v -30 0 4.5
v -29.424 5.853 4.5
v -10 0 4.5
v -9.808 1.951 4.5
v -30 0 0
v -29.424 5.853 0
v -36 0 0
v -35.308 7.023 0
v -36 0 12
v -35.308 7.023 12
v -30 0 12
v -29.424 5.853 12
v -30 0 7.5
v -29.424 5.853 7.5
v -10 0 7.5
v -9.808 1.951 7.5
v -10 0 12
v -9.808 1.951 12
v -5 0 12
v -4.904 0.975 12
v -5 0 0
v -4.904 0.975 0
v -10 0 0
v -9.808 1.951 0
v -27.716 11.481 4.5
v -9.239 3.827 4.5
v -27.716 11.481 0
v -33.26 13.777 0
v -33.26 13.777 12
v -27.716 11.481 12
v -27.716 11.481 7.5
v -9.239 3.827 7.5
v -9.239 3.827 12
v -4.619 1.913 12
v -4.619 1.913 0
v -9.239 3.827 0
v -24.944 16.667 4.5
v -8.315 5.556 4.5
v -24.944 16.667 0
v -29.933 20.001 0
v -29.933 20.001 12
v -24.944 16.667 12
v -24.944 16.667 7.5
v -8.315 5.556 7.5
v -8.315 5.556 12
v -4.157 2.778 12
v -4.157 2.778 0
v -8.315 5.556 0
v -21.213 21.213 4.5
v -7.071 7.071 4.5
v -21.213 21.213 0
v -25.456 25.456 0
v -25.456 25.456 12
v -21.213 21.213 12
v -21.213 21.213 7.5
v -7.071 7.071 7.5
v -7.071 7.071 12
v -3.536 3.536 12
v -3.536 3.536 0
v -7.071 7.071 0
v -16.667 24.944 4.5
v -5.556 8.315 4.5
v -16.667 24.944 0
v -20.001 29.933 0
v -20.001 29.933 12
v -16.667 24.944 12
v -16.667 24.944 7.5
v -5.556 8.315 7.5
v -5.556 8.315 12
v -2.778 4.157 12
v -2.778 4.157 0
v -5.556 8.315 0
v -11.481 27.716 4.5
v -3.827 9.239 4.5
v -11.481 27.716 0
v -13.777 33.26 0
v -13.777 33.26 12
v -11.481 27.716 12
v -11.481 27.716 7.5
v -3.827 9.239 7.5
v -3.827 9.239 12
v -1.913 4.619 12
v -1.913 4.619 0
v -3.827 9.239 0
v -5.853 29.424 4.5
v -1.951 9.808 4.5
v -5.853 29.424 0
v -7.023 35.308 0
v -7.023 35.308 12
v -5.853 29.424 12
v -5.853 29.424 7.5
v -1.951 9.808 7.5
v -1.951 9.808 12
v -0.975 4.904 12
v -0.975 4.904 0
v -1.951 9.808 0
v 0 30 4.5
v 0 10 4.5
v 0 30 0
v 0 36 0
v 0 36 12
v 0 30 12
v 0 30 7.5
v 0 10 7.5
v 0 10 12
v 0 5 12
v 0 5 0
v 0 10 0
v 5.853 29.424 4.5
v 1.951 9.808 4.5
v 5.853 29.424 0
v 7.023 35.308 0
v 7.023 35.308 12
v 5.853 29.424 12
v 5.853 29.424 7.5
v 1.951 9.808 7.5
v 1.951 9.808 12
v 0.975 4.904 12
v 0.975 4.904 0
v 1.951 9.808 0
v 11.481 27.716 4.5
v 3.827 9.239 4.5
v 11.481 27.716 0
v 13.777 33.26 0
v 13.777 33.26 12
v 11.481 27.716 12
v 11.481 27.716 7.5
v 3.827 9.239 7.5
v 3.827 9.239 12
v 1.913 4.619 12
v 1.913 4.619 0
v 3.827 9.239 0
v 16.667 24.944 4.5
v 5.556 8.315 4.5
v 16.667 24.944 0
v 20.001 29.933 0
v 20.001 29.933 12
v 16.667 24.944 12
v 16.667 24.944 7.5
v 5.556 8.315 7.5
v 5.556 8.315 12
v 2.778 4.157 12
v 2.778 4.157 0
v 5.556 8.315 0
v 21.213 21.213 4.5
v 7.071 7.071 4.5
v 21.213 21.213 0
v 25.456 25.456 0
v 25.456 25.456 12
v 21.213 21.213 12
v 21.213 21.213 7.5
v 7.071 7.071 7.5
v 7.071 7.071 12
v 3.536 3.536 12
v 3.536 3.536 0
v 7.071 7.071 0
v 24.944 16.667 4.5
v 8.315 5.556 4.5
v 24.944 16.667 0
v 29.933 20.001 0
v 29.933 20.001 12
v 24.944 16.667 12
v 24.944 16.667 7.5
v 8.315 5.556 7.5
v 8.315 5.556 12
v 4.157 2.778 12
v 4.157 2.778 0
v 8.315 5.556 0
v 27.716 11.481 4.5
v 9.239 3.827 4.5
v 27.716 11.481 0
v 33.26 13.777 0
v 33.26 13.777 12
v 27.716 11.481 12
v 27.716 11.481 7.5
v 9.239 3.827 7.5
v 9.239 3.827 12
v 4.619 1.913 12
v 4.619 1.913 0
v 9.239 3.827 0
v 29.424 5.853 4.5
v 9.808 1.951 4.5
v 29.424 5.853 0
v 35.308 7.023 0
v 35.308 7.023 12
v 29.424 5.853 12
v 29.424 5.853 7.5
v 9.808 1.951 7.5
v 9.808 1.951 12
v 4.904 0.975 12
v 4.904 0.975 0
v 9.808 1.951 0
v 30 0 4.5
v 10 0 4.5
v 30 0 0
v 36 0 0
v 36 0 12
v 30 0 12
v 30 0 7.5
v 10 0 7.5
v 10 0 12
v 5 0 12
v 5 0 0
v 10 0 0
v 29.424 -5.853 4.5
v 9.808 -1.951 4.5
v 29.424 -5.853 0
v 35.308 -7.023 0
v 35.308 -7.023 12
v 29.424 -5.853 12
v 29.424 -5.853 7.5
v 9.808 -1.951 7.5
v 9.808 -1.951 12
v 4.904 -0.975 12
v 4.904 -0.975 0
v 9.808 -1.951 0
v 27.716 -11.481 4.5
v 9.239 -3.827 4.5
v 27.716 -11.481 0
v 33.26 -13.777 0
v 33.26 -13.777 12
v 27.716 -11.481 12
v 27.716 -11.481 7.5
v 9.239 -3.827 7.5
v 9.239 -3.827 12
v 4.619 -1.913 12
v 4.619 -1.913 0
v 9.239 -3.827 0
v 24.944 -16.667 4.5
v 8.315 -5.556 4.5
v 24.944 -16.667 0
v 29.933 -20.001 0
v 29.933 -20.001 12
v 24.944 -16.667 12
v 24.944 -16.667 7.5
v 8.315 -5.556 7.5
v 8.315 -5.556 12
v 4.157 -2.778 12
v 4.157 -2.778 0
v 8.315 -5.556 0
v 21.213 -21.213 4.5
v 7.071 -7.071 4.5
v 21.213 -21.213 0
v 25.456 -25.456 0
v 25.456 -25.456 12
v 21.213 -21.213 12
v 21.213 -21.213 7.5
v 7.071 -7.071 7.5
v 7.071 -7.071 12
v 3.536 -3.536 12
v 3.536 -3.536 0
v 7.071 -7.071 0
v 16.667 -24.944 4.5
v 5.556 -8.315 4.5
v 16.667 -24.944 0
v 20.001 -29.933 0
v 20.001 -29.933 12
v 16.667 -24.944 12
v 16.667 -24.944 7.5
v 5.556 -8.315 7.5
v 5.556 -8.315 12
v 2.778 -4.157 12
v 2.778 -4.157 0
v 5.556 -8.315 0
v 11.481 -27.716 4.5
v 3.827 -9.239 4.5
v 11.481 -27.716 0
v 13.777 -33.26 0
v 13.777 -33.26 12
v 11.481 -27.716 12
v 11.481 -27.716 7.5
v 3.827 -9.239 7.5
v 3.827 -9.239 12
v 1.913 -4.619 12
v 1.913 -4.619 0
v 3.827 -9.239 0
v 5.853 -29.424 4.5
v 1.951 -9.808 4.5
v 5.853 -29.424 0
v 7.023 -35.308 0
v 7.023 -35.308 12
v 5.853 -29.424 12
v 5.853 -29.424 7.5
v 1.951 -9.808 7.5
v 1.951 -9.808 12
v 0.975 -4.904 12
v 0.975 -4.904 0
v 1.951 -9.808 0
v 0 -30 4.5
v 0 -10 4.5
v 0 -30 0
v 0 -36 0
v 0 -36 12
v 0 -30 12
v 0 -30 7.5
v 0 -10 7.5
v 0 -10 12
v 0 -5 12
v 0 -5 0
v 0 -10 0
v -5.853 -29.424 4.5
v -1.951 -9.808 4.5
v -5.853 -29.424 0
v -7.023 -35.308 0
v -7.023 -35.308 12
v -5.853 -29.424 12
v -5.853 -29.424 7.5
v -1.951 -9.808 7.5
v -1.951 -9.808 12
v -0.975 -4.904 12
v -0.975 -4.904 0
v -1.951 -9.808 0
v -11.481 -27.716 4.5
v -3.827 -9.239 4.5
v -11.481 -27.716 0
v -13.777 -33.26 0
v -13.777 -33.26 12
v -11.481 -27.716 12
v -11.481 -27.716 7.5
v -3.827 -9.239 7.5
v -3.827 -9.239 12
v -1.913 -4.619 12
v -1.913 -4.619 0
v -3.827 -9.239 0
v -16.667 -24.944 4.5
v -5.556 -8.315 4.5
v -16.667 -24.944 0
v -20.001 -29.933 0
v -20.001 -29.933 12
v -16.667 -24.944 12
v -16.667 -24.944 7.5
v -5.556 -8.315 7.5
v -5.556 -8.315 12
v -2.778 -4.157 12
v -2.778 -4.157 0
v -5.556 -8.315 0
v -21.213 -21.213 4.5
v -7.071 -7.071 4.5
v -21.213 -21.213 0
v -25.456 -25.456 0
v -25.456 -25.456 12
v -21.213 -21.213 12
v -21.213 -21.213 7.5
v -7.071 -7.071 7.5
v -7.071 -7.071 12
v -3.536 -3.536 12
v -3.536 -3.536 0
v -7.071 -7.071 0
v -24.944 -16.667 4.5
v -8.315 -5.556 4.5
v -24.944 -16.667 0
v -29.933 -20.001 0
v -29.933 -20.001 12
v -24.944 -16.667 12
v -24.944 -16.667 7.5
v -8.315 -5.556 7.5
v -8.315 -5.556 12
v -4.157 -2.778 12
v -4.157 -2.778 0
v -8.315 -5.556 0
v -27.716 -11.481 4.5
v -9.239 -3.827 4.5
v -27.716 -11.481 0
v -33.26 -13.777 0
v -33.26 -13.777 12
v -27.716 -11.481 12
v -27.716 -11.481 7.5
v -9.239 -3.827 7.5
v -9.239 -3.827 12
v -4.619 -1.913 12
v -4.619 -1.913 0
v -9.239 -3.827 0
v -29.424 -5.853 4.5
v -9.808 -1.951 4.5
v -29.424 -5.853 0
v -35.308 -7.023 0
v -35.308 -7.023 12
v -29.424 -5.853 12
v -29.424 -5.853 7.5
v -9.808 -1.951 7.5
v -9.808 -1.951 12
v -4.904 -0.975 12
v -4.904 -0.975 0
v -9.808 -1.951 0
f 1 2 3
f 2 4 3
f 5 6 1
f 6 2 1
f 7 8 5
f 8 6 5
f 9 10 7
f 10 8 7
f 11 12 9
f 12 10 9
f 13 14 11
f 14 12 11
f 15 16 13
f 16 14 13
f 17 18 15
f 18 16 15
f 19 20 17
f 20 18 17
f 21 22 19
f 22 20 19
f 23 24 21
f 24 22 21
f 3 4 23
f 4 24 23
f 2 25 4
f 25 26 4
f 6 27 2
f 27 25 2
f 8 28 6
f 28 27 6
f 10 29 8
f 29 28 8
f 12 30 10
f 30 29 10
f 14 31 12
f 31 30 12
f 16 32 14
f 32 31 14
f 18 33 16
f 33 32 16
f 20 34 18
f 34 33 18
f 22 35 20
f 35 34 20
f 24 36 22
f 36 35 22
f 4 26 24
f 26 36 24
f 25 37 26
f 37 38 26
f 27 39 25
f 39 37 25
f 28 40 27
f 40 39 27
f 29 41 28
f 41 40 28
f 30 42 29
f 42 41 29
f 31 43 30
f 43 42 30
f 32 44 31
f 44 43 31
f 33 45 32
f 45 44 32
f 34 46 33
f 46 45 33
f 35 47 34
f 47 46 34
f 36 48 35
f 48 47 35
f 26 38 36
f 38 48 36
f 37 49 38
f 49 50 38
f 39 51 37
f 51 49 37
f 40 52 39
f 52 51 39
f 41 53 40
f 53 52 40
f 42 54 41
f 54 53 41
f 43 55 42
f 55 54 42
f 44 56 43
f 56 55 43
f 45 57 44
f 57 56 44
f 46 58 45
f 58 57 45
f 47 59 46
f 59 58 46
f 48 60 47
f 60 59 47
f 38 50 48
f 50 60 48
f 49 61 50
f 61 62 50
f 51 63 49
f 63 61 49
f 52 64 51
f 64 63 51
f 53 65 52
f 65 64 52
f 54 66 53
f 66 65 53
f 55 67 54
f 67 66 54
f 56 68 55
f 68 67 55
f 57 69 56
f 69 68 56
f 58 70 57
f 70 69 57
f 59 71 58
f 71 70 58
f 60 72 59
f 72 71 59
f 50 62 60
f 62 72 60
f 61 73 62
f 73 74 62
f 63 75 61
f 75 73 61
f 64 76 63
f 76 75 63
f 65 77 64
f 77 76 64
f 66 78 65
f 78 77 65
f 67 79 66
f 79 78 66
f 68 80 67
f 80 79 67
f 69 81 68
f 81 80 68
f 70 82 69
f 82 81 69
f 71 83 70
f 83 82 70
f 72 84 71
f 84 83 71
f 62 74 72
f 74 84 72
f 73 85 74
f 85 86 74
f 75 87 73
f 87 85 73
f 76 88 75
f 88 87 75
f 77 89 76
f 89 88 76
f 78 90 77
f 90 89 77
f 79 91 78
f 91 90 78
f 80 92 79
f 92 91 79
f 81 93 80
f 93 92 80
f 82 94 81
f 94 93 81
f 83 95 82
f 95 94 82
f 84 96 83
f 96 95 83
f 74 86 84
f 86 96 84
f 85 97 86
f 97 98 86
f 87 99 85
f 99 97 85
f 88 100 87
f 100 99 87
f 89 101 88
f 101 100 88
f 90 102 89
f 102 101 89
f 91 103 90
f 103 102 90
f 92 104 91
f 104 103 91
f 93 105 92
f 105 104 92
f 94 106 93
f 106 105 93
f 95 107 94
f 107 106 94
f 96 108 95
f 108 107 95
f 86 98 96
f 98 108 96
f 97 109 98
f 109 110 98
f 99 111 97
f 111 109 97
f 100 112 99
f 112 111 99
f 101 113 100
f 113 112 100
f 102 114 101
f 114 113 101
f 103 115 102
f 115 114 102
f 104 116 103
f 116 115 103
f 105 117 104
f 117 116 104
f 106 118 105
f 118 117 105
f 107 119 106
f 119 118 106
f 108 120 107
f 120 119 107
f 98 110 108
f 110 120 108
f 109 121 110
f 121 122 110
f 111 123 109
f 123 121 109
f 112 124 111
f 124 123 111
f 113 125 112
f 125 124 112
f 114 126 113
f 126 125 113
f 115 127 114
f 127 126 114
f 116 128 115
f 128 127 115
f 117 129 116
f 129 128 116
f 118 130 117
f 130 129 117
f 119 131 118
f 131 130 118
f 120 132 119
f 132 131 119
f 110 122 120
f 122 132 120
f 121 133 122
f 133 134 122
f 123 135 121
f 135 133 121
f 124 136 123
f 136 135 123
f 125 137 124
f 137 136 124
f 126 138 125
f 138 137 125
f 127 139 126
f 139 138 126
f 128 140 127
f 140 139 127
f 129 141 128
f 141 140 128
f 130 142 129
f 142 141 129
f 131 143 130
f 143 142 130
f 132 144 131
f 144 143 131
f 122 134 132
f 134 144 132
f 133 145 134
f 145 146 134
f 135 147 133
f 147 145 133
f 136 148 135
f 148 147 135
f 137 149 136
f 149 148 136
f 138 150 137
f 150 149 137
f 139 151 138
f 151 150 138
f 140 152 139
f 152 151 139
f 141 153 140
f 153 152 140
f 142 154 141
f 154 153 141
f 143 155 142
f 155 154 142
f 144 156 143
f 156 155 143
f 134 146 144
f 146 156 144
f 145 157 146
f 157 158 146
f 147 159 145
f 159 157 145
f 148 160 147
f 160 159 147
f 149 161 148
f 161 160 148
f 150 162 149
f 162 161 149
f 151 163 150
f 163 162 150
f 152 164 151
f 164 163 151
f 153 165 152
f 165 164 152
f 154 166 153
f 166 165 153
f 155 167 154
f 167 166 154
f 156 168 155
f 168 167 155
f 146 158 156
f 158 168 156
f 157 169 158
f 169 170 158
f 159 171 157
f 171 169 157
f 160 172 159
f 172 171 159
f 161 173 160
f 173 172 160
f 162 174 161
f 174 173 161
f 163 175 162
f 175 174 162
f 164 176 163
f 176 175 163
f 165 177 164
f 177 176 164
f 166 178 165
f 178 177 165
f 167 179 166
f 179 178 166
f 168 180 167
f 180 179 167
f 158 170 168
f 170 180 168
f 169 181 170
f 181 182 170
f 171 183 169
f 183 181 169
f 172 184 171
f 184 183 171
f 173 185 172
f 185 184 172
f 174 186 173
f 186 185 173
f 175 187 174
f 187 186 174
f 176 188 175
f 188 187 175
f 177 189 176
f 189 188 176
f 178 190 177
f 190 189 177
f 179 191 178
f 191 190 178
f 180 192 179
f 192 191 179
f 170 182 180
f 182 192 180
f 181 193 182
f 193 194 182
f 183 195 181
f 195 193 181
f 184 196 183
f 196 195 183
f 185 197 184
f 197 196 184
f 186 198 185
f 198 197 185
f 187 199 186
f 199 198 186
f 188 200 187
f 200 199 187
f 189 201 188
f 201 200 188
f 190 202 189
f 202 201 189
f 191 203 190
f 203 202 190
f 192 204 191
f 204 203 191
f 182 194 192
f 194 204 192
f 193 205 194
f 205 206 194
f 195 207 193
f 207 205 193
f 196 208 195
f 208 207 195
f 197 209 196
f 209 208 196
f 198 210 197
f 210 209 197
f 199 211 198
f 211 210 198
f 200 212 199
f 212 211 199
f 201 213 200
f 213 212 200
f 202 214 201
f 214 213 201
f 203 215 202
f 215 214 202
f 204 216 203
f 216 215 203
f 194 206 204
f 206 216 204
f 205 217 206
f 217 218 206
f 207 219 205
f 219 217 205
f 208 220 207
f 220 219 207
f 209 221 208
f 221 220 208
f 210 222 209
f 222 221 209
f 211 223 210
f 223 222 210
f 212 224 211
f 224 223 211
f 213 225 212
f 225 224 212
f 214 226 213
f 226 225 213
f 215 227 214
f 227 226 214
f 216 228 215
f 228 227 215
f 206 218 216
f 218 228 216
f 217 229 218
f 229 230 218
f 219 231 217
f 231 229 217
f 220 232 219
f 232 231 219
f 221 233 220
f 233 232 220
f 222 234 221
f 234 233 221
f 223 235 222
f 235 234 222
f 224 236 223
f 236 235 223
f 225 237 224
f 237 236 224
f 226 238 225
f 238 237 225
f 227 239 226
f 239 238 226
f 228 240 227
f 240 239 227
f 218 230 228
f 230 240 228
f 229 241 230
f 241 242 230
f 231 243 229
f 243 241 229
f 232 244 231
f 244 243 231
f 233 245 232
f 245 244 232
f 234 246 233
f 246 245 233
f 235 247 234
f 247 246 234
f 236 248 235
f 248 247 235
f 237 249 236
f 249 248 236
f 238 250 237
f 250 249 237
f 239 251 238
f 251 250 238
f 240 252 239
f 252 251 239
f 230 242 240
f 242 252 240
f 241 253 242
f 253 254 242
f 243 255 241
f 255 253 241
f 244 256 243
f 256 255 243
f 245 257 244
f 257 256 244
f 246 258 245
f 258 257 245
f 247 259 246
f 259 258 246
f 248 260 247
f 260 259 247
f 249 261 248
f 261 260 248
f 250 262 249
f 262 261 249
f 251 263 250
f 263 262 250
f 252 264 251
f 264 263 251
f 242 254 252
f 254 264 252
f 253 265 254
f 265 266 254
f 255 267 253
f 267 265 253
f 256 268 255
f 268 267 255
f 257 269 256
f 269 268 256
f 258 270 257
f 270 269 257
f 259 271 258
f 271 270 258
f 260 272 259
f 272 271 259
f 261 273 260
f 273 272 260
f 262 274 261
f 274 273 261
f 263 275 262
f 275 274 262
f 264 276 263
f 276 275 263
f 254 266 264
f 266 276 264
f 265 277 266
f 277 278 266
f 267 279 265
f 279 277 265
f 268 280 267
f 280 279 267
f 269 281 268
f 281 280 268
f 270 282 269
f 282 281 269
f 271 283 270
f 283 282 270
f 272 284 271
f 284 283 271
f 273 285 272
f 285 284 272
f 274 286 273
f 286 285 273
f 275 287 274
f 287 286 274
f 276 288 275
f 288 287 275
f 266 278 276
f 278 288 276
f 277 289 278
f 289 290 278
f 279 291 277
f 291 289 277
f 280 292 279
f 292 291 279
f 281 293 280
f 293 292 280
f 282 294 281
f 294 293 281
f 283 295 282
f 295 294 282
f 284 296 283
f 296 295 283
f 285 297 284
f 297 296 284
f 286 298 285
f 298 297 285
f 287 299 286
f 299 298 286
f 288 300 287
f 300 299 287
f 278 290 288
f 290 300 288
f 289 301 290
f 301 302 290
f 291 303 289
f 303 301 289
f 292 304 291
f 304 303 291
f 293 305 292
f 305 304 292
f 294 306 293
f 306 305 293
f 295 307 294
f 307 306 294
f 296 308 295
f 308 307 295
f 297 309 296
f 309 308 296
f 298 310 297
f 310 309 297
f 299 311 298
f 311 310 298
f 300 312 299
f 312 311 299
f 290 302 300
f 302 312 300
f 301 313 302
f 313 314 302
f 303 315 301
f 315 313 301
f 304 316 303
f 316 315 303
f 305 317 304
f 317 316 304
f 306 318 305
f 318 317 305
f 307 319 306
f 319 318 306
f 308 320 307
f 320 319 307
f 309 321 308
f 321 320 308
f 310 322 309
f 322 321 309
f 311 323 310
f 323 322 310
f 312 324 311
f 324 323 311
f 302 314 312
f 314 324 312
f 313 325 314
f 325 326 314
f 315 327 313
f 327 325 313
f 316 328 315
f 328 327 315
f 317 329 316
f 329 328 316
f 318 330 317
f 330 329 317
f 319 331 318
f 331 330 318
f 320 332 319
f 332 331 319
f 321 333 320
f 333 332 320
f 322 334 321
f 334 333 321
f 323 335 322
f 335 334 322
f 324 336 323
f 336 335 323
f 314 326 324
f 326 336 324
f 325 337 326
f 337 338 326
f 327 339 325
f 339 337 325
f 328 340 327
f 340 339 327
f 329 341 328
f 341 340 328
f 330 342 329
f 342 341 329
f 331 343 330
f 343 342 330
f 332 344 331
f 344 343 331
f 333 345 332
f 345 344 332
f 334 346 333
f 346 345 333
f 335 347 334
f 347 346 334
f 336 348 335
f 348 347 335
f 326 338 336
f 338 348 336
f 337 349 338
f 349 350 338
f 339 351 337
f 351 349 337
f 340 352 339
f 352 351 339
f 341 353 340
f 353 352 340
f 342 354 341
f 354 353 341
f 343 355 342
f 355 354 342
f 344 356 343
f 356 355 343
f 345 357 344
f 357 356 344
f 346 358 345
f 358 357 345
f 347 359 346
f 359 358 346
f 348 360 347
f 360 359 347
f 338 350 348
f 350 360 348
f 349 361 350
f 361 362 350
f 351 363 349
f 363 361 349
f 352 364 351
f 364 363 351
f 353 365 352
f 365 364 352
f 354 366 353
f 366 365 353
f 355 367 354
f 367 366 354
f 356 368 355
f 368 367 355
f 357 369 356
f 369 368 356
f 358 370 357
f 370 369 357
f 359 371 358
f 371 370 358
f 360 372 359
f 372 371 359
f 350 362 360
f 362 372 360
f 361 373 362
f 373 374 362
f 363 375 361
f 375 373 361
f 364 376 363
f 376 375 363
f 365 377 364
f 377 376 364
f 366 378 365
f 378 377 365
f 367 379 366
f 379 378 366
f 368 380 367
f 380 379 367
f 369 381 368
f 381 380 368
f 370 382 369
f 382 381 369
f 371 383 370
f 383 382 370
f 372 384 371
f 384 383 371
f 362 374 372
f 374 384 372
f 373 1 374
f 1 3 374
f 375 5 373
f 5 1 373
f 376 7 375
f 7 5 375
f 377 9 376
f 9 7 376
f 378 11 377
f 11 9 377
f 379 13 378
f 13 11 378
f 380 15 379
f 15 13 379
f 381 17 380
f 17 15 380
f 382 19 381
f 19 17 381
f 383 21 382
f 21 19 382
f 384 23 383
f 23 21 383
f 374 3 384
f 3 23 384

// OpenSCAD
$fn = 32;

// ----------------------------------------------------------------------
// Revolved part: handwheel R36
// ----------------------------------------------------------------------

// --- parameters (mm) ---
bore_r = 5;               // bore radius
rim_r = 36;               // rim radius
rim_w = 6;                // rim axial width
rim_t = 12;               // rim diameter height
hub_r = 10;               // hub radius
web_t = 3;                // web thickness
revolve_angle = 360;      // revolve sweep, degrees

bore_d = 2 * bore_r;
rim_d = 2 * rim_r;
hub_d = 2 * hub_r;

profile = [[5, 0], [10, 0], [10, 4.5], [30, 4.5], [30, 0], [36, 0], [36, 12], [30, 12], [30, 7.5], [10, 7.5], [10, 12], [5, 12]];  // primary outline, 12 points, counter clockwise

// --- the one profile operation ---
rotate_extrude(angle = revolve_angle) polygon(points = profile);
